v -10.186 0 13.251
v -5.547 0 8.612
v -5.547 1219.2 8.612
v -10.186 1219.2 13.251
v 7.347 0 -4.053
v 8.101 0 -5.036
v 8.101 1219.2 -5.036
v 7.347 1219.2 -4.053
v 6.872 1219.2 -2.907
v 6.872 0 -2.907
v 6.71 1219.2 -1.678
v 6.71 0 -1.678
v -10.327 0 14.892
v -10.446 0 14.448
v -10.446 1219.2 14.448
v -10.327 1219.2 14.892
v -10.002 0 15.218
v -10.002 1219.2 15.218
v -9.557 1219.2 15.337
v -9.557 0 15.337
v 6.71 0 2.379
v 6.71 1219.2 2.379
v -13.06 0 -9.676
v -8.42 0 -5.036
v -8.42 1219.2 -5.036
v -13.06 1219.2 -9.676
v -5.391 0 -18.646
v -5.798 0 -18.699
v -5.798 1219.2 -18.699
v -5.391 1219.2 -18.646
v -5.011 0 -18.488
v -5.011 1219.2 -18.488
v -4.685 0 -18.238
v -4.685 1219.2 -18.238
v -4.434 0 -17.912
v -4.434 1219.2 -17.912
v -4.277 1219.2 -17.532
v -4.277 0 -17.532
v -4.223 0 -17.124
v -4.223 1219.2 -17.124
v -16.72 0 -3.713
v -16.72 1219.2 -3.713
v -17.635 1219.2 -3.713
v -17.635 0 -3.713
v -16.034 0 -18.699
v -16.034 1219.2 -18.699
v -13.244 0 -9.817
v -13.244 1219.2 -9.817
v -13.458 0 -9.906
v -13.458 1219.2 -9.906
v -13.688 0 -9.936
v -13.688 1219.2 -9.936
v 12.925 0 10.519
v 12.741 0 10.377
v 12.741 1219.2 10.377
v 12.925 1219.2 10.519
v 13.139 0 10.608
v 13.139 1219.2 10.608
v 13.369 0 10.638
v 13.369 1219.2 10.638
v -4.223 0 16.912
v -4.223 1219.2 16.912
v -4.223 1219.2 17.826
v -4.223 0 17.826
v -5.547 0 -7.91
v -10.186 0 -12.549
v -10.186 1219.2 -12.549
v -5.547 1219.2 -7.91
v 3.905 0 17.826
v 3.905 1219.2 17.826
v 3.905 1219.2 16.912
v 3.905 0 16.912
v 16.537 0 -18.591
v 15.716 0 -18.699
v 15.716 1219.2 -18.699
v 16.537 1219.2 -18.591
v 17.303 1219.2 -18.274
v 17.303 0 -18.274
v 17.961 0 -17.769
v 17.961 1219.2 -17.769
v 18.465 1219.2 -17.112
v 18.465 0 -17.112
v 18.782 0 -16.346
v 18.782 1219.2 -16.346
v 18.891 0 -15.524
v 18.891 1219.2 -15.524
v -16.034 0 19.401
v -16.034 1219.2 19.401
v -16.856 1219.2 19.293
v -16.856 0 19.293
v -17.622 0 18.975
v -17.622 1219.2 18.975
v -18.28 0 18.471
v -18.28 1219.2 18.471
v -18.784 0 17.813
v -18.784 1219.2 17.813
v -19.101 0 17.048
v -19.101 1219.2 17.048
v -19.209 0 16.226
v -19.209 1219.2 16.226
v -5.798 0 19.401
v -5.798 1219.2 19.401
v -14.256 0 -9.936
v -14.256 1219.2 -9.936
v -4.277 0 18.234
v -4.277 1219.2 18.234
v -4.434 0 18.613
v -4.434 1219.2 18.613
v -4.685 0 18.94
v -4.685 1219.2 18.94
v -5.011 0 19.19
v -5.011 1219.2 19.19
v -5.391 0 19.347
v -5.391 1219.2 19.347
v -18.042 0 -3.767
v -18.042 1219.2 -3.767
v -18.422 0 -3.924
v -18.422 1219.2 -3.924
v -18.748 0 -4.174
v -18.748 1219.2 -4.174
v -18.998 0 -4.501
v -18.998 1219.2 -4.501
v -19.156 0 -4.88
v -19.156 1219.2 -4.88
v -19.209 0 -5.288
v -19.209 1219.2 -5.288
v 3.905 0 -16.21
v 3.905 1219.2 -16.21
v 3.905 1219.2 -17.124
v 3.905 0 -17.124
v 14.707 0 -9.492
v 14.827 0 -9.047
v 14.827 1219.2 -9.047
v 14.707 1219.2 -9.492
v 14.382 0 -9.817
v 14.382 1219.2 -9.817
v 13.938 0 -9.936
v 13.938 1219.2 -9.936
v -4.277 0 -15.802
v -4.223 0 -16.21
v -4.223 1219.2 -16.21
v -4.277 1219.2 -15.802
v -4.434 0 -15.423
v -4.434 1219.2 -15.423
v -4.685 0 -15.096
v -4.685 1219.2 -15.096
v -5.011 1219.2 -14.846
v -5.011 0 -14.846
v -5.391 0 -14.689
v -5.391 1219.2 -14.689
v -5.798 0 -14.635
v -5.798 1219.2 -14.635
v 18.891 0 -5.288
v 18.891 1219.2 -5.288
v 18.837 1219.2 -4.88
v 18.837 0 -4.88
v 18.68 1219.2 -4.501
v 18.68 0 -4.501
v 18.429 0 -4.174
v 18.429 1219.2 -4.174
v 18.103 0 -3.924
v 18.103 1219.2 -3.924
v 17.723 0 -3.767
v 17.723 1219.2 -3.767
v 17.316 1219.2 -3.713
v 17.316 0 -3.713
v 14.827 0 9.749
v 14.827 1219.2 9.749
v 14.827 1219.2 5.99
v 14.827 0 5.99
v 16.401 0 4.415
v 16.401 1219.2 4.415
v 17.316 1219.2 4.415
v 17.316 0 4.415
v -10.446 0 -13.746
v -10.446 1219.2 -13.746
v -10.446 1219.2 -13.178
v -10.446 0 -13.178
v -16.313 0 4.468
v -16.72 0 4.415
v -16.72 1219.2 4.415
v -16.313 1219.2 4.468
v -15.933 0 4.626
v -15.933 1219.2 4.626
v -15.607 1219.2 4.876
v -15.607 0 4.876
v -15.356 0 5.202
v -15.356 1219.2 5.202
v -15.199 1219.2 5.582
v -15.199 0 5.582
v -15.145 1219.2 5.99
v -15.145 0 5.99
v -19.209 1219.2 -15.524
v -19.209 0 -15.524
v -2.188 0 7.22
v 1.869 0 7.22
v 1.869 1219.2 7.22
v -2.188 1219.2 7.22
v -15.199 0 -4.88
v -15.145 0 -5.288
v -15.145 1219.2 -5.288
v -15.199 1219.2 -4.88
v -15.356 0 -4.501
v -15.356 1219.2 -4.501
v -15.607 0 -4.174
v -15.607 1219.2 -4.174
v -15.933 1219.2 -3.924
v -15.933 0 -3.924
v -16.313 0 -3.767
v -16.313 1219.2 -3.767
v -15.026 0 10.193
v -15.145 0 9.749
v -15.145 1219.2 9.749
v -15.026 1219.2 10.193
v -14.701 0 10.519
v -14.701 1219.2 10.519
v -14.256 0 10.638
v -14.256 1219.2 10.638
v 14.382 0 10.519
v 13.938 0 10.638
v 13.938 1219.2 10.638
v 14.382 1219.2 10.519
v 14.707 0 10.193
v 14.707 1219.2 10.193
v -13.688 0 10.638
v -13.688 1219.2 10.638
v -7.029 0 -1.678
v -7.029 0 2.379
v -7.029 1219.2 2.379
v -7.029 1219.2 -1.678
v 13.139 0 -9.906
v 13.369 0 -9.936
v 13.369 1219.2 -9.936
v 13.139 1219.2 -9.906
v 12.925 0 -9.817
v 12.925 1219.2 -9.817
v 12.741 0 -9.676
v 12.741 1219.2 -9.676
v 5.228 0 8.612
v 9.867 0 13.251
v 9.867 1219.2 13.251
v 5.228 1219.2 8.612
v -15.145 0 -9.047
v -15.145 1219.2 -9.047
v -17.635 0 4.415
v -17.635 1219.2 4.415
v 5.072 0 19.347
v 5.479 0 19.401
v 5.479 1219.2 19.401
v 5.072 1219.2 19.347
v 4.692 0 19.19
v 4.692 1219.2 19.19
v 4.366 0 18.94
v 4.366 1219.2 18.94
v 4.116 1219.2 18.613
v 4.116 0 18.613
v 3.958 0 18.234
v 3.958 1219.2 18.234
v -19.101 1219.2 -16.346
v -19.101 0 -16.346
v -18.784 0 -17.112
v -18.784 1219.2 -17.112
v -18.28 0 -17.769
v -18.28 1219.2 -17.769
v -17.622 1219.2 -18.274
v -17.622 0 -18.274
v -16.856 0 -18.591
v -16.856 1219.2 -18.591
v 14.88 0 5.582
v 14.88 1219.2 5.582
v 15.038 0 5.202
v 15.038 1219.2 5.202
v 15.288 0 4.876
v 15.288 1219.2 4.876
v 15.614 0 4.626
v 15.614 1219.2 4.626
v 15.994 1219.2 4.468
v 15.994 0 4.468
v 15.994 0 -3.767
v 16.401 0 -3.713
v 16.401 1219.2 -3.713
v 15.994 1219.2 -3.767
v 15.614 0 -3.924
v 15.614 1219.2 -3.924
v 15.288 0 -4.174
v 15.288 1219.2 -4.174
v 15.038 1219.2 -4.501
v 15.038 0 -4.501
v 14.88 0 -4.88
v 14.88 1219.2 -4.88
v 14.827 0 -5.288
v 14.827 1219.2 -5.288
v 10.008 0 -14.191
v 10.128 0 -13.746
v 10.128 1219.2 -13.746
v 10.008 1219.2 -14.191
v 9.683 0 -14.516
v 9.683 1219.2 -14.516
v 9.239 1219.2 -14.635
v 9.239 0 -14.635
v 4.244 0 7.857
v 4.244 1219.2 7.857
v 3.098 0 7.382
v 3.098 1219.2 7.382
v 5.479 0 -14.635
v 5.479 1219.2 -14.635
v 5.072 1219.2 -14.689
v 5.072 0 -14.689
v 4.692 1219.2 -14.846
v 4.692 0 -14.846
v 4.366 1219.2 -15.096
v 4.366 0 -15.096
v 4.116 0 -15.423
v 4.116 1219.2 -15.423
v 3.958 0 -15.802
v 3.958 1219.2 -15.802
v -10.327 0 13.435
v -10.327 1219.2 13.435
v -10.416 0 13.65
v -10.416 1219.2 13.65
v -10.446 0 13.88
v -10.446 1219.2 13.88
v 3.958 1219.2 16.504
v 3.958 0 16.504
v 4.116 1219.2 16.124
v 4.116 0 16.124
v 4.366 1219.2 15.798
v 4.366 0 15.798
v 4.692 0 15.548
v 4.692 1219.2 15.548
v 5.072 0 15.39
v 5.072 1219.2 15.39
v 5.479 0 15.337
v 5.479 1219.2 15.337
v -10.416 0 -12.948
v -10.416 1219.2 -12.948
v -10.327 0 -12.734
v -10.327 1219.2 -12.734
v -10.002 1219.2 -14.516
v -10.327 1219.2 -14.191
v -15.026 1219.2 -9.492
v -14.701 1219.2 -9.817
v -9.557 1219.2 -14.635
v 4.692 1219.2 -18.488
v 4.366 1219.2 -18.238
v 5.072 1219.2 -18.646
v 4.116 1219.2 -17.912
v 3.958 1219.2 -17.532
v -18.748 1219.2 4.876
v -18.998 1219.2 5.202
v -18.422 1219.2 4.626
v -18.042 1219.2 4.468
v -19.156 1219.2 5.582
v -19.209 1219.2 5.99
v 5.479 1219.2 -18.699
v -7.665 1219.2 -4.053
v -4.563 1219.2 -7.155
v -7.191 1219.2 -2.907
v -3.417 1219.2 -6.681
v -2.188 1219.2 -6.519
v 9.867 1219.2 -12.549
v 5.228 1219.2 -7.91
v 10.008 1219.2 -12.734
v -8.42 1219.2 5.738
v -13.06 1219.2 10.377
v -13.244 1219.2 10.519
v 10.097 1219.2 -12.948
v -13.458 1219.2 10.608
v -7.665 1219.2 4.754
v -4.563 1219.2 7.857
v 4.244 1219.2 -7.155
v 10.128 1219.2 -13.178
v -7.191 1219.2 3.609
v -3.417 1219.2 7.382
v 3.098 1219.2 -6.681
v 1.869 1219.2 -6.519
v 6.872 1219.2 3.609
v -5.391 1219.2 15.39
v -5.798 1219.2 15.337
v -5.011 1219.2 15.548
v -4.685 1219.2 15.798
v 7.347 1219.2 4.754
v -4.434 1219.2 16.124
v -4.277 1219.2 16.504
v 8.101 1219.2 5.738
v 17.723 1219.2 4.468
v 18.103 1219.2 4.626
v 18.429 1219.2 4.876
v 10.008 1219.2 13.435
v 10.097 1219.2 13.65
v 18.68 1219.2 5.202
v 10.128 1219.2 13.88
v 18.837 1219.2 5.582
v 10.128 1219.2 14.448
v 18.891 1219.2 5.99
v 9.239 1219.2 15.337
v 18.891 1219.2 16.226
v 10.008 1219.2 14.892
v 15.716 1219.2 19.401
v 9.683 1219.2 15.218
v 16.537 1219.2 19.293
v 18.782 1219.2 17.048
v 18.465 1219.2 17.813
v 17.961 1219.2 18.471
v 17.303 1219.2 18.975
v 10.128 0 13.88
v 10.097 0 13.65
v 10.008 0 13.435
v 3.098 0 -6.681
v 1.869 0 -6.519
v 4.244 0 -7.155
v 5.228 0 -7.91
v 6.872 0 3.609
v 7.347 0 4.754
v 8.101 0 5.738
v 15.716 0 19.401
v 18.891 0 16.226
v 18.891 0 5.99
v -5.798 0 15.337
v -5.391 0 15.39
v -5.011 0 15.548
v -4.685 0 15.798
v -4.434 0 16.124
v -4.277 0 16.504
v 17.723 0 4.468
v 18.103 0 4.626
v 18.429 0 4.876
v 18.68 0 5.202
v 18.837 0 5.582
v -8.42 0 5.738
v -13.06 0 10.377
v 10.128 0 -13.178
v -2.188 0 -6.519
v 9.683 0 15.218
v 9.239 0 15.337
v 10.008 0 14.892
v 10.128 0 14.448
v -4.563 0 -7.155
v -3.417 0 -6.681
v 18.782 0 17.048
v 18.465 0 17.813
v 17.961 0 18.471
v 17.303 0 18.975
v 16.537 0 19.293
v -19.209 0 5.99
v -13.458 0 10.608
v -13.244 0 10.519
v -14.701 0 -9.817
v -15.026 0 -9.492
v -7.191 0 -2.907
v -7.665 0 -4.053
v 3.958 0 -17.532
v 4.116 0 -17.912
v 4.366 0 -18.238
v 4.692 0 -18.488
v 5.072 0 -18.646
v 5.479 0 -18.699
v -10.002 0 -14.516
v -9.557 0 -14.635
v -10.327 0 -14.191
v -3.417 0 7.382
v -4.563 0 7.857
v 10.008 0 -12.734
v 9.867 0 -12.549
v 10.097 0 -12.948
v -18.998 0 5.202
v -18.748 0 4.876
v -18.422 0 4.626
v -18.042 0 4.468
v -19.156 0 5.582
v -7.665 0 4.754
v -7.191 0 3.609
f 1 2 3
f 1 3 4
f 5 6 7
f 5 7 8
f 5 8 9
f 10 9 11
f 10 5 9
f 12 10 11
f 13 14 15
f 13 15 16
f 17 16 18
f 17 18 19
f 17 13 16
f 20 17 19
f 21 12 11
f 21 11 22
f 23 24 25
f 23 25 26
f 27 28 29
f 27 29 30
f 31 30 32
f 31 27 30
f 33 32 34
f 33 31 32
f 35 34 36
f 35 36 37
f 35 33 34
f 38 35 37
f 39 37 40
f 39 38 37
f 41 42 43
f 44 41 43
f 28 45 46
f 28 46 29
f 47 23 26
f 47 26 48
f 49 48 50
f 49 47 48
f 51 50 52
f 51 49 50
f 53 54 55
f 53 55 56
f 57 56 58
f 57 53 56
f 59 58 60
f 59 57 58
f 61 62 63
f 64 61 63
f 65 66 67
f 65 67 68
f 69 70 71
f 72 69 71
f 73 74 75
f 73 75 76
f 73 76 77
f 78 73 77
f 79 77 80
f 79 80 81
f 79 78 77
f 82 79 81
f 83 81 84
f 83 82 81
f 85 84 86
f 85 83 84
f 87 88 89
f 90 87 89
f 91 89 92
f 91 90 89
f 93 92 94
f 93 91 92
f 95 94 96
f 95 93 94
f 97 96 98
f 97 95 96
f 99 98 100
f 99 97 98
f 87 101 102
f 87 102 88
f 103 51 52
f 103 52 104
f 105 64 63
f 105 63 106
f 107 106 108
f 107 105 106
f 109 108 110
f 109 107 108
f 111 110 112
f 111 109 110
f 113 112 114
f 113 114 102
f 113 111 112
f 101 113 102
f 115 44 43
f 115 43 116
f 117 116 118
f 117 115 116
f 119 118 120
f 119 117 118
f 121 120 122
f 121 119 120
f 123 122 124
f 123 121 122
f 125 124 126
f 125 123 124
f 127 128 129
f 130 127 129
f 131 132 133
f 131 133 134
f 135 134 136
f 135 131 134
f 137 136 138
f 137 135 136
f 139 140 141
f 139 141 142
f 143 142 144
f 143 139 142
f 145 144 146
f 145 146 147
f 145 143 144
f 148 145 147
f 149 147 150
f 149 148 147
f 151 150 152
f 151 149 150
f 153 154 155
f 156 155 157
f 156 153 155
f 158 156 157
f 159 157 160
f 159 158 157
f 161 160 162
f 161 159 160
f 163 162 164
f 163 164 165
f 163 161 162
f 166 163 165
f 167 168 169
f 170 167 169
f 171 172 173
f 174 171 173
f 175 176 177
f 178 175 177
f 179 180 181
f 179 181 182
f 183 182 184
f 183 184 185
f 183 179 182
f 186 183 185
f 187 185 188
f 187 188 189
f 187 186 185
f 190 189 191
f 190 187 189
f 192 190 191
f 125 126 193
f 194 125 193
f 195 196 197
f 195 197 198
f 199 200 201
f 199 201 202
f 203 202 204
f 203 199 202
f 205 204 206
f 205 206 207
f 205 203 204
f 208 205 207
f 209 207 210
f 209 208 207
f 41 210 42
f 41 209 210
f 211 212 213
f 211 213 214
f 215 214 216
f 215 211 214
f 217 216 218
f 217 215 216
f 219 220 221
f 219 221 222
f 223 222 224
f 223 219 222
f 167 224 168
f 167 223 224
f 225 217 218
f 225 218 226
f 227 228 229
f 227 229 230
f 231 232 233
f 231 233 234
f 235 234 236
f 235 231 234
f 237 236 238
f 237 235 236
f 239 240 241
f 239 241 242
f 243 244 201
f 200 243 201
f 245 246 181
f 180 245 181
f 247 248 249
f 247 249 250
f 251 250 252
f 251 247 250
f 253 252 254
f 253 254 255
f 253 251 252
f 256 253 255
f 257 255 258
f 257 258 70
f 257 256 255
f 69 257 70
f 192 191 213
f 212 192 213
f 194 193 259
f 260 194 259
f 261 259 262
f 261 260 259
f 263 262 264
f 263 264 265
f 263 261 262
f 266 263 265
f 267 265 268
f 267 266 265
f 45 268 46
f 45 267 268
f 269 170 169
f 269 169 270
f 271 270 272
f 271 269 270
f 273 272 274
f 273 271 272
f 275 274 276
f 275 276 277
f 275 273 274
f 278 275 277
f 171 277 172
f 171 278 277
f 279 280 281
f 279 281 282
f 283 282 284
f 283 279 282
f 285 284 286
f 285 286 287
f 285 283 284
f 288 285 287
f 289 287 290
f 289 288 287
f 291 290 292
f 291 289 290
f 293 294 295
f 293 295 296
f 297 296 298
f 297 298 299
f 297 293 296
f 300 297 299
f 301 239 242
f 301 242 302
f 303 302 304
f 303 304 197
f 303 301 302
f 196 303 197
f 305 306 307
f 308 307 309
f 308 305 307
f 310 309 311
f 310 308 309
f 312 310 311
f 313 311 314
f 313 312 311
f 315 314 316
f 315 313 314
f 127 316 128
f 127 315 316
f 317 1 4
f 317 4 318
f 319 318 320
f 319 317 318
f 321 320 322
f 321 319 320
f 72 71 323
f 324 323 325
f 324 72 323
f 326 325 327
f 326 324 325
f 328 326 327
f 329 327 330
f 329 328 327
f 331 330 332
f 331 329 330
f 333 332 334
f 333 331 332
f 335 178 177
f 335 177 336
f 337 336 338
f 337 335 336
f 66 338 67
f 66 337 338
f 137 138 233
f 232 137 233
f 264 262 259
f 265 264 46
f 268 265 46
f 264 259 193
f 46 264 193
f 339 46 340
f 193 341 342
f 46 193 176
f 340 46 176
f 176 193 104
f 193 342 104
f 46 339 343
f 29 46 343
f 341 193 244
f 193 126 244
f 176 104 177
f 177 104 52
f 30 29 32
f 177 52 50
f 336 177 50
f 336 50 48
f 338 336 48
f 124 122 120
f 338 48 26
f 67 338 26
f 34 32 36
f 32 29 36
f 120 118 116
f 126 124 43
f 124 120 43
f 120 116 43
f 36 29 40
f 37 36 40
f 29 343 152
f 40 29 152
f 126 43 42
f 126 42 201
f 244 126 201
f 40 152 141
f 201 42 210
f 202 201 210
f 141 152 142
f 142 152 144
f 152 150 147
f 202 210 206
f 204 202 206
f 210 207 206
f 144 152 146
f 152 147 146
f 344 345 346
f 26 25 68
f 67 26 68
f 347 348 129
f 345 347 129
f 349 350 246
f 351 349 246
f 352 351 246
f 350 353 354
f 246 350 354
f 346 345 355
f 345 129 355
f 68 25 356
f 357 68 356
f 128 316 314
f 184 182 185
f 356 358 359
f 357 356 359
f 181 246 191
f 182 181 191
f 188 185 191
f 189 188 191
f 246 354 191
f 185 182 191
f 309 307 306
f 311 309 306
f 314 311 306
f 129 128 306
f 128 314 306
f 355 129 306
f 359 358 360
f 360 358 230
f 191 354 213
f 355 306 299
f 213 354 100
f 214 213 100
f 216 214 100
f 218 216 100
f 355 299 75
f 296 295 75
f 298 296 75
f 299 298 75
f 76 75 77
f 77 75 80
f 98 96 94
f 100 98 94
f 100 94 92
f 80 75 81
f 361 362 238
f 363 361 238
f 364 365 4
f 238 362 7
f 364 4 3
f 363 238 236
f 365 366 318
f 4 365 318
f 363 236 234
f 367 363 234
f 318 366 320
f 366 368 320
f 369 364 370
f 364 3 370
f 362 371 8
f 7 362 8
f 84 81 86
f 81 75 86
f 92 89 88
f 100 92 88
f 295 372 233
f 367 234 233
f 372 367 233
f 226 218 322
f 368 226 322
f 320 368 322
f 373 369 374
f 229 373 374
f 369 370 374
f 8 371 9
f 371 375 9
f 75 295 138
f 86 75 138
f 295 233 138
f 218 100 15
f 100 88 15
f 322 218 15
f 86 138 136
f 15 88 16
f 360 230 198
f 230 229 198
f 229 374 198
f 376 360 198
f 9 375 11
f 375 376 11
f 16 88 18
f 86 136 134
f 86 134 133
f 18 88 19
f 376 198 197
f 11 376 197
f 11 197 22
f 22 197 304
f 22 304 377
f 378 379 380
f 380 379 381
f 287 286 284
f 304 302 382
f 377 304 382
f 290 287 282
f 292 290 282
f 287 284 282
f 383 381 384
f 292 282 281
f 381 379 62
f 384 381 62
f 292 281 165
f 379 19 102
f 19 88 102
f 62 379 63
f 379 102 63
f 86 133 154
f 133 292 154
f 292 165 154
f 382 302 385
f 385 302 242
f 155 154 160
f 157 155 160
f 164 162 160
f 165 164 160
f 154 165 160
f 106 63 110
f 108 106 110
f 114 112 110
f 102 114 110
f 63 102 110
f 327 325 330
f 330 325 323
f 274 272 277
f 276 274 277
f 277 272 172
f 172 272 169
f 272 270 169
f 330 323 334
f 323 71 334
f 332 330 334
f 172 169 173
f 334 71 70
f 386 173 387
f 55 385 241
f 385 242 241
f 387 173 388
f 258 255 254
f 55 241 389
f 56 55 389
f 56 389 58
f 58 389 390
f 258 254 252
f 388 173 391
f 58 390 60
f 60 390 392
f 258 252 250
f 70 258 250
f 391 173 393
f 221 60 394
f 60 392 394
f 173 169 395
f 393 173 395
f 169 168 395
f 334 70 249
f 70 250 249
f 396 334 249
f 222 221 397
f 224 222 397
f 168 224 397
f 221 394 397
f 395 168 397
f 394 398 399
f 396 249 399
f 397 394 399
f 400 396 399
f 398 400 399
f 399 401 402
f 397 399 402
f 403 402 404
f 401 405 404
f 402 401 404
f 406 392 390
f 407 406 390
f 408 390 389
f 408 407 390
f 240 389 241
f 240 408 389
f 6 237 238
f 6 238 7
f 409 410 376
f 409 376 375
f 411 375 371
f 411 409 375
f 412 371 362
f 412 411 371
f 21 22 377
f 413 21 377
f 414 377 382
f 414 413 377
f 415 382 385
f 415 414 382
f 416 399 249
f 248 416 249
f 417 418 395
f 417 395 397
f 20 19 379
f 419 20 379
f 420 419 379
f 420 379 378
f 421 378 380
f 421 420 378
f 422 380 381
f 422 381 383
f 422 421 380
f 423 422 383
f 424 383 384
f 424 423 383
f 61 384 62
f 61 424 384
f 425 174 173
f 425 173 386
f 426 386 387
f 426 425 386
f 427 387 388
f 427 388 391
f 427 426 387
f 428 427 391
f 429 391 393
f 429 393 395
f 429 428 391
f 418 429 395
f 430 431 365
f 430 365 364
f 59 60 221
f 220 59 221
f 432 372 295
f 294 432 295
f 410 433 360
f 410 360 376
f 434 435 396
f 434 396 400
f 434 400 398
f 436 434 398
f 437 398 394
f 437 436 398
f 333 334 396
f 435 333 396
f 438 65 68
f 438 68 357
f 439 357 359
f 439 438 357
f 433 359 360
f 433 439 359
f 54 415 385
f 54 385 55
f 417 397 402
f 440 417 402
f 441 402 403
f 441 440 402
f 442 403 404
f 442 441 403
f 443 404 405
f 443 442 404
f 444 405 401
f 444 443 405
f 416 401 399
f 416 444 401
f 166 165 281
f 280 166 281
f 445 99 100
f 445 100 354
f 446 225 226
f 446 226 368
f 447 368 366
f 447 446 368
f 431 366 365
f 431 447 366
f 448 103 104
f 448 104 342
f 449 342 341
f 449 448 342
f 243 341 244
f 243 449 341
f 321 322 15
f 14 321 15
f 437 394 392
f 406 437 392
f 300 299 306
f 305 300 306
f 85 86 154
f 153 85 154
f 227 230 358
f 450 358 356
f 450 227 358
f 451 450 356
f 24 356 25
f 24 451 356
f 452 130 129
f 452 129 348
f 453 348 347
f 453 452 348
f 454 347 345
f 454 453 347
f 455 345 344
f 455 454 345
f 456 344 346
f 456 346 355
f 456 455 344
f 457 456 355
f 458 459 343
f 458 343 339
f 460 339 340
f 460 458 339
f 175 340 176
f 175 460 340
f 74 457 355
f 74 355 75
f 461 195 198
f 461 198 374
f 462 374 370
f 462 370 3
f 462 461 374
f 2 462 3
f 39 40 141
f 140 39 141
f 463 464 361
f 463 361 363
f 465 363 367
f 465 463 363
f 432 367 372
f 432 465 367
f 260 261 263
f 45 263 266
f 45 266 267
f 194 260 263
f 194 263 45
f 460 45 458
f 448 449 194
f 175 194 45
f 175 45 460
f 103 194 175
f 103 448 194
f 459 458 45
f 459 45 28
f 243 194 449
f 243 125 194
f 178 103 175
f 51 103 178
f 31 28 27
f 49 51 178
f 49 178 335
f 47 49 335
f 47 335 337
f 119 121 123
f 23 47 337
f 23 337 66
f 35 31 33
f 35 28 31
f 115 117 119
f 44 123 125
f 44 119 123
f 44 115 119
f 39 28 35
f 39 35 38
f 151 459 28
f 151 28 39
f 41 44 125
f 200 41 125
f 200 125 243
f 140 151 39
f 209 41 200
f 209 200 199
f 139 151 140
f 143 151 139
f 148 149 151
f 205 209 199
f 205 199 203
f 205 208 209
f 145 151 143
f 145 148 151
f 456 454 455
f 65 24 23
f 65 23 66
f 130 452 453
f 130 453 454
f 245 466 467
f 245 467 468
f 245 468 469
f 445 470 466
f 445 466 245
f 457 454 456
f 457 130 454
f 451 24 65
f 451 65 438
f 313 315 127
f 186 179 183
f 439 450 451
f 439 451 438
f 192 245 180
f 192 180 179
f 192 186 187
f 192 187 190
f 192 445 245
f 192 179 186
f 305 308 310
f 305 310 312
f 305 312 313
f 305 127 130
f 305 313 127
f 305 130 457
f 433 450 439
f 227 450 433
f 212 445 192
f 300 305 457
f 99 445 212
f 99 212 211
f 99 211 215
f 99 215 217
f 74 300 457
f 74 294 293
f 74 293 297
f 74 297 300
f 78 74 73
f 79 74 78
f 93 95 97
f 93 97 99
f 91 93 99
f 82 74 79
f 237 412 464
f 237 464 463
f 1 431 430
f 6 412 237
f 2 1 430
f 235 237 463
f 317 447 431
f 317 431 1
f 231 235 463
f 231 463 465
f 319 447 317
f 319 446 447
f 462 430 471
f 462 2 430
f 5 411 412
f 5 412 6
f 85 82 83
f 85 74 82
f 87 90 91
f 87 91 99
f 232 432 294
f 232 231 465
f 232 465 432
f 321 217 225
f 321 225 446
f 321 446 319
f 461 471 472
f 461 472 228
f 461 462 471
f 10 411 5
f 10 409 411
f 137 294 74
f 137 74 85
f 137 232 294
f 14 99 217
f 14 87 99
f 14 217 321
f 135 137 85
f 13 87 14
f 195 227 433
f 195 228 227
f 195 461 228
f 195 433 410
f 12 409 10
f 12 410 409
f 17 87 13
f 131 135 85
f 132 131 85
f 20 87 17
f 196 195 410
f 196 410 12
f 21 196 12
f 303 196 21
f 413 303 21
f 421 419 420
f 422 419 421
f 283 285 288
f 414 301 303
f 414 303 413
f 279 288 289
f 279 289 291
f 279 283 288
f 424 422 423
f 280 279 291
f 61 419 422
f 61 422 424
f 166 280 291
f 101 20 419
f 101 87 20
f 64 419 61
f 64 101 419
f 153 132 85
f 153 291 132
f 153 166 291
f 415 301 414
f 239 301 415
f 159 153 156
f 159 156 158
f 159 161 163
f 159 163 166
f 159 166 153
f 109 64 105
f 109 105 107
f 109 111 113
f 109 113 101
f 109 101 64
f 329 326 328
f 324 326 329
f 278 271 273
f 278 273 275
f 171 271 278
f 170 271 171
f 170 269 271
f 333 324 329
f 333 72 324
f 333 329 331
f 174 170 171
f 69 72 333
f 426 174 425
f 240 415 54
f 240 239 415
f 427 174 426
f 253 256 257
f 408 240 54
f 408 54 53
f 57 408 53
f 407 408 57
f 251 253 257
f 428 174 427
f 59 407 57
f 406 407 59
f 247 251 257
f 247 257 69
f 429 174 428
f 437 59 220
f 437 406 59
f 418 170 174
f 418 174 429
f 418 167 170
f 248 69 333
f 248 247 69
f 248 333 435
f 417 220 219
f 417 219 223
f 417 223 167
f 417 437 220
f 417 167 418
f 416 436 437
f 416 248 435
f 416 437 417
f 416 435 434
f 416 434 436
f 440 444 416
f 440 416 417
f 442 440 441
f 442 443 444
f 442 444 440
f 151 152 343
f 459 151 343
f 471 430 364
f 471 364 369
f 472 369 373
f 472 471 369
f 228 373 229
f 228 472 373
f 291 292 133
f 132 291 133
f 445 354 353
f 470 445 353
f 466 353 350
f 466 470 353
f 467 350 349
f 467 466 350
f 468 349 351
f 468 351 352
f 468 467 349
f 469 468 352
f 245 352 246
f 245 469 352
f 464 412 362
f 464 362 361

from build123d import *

# Parameters (mm, degrees)
F1_DEPTH = 1219.2


with BuildPart() as f1:
    # F0 (on Front) → F1 (new body)
    with BuildSketch(Plane.XZ):
        with BuildLine():
            Line((-5.798256, 19.400802), (-16.034456, 19.400802))
            ThreePointArc((-16.034456, 19.400802), (-18.27952, 18.470866), (-19.209456, 16.225802))
            Line((-19.209456, 16.225802), (-19.209456, 5.989602))
            ThreePointArc((-19.209456, 5.989602), (-18.748207, 4.87605), (-17.634656, 4.414802))
            Line((-17.634656, 4.414802), (-16.720256, 4.414802))
            ThreePointArc((-16.720256, 4.414802), (-15.606704, 4.87605), (-15.145456, 5.989602))
            Line((-15.145456, 5.989602), (-15.145456, 9.748802))
            ThreePointArc((-15.145456, 9.748802), (-14.885073, 10.37742), (-14.256456, 10.637802))
            Line((-14.256456, 10.637802), (-13.688373, 10.637802))
            ThreePointArc((-13.688373, 10.637802), (-13.348168, 10.570131), (-13.059755, 10.37742))
            Line((-13.059755, 10.37742), (-8.420296, 5.737961))
            ThreePointArc((-8.420296, 5.737961), (-7.390669, 4.197015), (-7.029112, 2.379345))
            Line((-7.029112, 2.379345), (-7.029112, -1.67774))
            ThreePointArc((-7.029112, -1.67774), (-7.390669, -3.49541), (-8.420296, -5.036356))
            Line((-8.420296, -5.036356), (-13.059755, -9.675816))
            ThreePointArc((-13.059755, -9.675816), (-13.348168, -9.868527), (-13.688373, -9.936198))
            Line((-13.688373, -9.936198), (-14.256456, -9.936198))
            ThreePointArc((-14.256456, -9.936198), (-14.885073, -9.675816), (-15.145456, -9.047198))
            Line((-15.145456, -9.047198), (-15.145456, -5.287998))
            ThreePointArc((-15.145456, -5.287998), (-15.606704, -4.174446), (-16.720256, -3.713198))
            Line((-16.720256, -3.713198), (-17.634656, -3.713198))
            ThreePointArc((-17.634656, -3.713198), (-18.748207, -4.174446), (-19.209456, -5.287998))
            Line((-19.209456, -5.287998), (-19.209456, -15.524198))
            ThreePointArc((-19.209456, -15.524198), (-18.27952, -17.769262), (-16.034456, -18.699198))
            Line((-16.034456, -18.699198), (-5.798256, -18.699198))
            ThreePointArc((-5.798256, -18.699198), (-4.684704, -18.23795), (-4.223456, -17.124398))
            Line((-4.223456, -17.124398), (-4.223456, -16.209998))
            ThreePointArc((-4.223456, -16.209998), (-4.684704, -15.096446), (-5.798256, -14.635198))
            Line((-5.798256, -14.635198), (-9.557456, -14.635198))
            ThreePointArc((-9.557456, -14.635198), (-10.186073, -14.374816), (-10.446456, -13.746198))
            Line((-10.446456, -13.746198), (-10.446456, -13.178116))
            ThreePointArc((-10.446456, -13.178116), (-10.378784, -12.83791), (-10.186073, -12.549498))
            Line((-10.186073, -12.549498), (-5.546614, -7.910038))
            ThreePointArc((-5.546614, -7.910038), (-4.005668, -6.880411), (-2.187998, -6.518854))
            Line((-2.187998, -6.518854), (1.869087, -6.518854))
            ThreePointArc((1.869087, -6.518854), (3.686757, -6.880411), (5.227703, -7.910038))
            Line((5.227703, -7.910038), (9.867162, -12.549498))
            ThreePointArc((9.867162, -12.549498), (10.059873, -12.83791), (10.127544, -13.178116))
            Line((10.127544, -13.178116), (10.127544, -13.746198))
            ThreePointArc((10.127544, -13.746198), (9.867162, -14.374816), (9.238544, -14.635198))
            Line((9.238544, -14.635198), (5.479344, -14.635198))
            ThreePointArc((5.479344, -14.635198), (4.365793, -15.096446), (3.904544, -16.209998))
            Line((3.904544, -16.209998), (3.904544, -17.124398))
            ThreePointArc((3.904544, -17.124398), (4.365793, -18.23795), (5.479344, -18.699198))
            Line((5.479344, -18.699198), (15.715544, -18.699198))
            ThreePointArc((15.715544, -18.699198), (17.960608, -17.769262), (18.890544, -15.524198))
            Line((18.890544, -15.524198), (18.890544, -5.287998))
            ThreePointArc((18.890544, -5.287998), (18.429296, -4.174446), (17.315744, -3.713198))
            Line((17.315744, -3.713198), (16.401344, -3.713198))
            ThreePointArc((16.401344, -3.713198), (15.287793, -4.174446), (14.826544, -5.287998))
            Line((14.826544, -5.287998), (14.826544, -9.047198))
            ThreePointArc((14.826544, -9.047198), (14.566162, -9.675816), (13.937544, -9.936198))
            Line((13.937544, -9.936198), (13.369462, -9.936198))
            ThreePointArc((13.369462, -9.936198), (13.029257, -9.868527), (12.740844, -9.675816))
            Line((12.740844, -9.675816), (8.101385, -5.036356))
            ThreePointArc((8.101385, -5.036356), (7.071758, -3.49541), (6.710201, -1.67774))
            Line((6.710201, -1.67774), (6.710201, 2.379345))
            ThreePointArc((6.710201, 2.379345), (7.071758, 4.197015), (8.101385, 5.737961))
            Line((8.101385, 5.737961), (12.740844, 10.37742))
            ThreePointArc((12.740844, 10.37742), (13.029257, 10.570131), (13.369462, 10.637802))
            Line((13.369462, 10.637802), (13.937544, 10.637802))
            ThreePointArc((13.937544, 10.637802), (14.566162, 10.37742), (14.826544, 9.748802))
            Line((14.826544, 9.748802), (14.826544, 5.989602))
            ThreePointArc((14.826544, 5.989602), (15.287793, 4.87605), (16.401344, 4.414802))
            Line((16.401344, 4.414802), (17.315744, 4.414802))
            ThreePointArc((17.315744, 4.414802), (18.429296, 4.87605), (18.890544, 5.989602))
            Line((18.890544, 5.989602), (18.890544, 16.225802))
            ThreePointArc((18.890544, 16.225802), (17.960608, 18.470866), (15.715544, 19.400802))
            Line((15.715544, 19.400802), (5.479344, 19.400802))
            ThreePointArc((5.479344, 19.400802), (4.365793, 18.939554), (3.904544, 17.826002))
            Line((3.904544, 17.826002), (3.904544, 16.911602))
            ThreePointArc((3.904544, 16.911602), (4.365793, 15.79805), (5.479344, 15.336802))
            Line((5.479344, 15.336802), (9.238544, 15.336802))
            ThreePointArc((9.238544, 15.336802), (9.867162, 15.07642), (10.127544, 14.447802))
            Line((10.127544, 14.447802), (10.127544, 13.87972))
            ThreePointArc((10.127544, 13.87972), (10.059873, 13.539514), (9.867162, 13.251102))
            Line((9.867162, 13.251102), (5.227703, 8.611643))
            ThreePointArc((5.227703, 8.611643), (3.686757, 7.582015), (1.869087, 7.220458))
            Line((1.869087, 7.220458), (-2.187998, 7.220458))
            ThreePointArc((-2.187998, 7.220458), (-4.005668, 7.582015), (-5.546614, 8.611643))
            Line((-5.546614, 8.611643), (-10.186073, 13.251102))
            ThreePointArc((-10.186073, 13.251102), (-10.378784, 13.539514), (-10.446456, 13.87972))
            Line((-10.446456, 13.87972), (-10.446456, 14.447802))
            ThreePointArc((-10.446456, 14.447802), (-10.186073, 15.07642), (-9.557456, 15.336802))
            Line((-9.557456, 15.336802), (-5.798256, 15.336802))
            ThreePointArc((-5.798256, 15.336802), (-4.684704, 15.79805), (-4.223456, 16.911602))
            Line((-4.223456, 16.911602), (-4.223456, 17.826002))
            ThreePointArc((-4.223456, 17.826002), (-4.684704, 18.939554), (-5.798256, 19.400802))
        make_face()
    extrude(amount=-F1_DEPTH)


solid = f1.part
